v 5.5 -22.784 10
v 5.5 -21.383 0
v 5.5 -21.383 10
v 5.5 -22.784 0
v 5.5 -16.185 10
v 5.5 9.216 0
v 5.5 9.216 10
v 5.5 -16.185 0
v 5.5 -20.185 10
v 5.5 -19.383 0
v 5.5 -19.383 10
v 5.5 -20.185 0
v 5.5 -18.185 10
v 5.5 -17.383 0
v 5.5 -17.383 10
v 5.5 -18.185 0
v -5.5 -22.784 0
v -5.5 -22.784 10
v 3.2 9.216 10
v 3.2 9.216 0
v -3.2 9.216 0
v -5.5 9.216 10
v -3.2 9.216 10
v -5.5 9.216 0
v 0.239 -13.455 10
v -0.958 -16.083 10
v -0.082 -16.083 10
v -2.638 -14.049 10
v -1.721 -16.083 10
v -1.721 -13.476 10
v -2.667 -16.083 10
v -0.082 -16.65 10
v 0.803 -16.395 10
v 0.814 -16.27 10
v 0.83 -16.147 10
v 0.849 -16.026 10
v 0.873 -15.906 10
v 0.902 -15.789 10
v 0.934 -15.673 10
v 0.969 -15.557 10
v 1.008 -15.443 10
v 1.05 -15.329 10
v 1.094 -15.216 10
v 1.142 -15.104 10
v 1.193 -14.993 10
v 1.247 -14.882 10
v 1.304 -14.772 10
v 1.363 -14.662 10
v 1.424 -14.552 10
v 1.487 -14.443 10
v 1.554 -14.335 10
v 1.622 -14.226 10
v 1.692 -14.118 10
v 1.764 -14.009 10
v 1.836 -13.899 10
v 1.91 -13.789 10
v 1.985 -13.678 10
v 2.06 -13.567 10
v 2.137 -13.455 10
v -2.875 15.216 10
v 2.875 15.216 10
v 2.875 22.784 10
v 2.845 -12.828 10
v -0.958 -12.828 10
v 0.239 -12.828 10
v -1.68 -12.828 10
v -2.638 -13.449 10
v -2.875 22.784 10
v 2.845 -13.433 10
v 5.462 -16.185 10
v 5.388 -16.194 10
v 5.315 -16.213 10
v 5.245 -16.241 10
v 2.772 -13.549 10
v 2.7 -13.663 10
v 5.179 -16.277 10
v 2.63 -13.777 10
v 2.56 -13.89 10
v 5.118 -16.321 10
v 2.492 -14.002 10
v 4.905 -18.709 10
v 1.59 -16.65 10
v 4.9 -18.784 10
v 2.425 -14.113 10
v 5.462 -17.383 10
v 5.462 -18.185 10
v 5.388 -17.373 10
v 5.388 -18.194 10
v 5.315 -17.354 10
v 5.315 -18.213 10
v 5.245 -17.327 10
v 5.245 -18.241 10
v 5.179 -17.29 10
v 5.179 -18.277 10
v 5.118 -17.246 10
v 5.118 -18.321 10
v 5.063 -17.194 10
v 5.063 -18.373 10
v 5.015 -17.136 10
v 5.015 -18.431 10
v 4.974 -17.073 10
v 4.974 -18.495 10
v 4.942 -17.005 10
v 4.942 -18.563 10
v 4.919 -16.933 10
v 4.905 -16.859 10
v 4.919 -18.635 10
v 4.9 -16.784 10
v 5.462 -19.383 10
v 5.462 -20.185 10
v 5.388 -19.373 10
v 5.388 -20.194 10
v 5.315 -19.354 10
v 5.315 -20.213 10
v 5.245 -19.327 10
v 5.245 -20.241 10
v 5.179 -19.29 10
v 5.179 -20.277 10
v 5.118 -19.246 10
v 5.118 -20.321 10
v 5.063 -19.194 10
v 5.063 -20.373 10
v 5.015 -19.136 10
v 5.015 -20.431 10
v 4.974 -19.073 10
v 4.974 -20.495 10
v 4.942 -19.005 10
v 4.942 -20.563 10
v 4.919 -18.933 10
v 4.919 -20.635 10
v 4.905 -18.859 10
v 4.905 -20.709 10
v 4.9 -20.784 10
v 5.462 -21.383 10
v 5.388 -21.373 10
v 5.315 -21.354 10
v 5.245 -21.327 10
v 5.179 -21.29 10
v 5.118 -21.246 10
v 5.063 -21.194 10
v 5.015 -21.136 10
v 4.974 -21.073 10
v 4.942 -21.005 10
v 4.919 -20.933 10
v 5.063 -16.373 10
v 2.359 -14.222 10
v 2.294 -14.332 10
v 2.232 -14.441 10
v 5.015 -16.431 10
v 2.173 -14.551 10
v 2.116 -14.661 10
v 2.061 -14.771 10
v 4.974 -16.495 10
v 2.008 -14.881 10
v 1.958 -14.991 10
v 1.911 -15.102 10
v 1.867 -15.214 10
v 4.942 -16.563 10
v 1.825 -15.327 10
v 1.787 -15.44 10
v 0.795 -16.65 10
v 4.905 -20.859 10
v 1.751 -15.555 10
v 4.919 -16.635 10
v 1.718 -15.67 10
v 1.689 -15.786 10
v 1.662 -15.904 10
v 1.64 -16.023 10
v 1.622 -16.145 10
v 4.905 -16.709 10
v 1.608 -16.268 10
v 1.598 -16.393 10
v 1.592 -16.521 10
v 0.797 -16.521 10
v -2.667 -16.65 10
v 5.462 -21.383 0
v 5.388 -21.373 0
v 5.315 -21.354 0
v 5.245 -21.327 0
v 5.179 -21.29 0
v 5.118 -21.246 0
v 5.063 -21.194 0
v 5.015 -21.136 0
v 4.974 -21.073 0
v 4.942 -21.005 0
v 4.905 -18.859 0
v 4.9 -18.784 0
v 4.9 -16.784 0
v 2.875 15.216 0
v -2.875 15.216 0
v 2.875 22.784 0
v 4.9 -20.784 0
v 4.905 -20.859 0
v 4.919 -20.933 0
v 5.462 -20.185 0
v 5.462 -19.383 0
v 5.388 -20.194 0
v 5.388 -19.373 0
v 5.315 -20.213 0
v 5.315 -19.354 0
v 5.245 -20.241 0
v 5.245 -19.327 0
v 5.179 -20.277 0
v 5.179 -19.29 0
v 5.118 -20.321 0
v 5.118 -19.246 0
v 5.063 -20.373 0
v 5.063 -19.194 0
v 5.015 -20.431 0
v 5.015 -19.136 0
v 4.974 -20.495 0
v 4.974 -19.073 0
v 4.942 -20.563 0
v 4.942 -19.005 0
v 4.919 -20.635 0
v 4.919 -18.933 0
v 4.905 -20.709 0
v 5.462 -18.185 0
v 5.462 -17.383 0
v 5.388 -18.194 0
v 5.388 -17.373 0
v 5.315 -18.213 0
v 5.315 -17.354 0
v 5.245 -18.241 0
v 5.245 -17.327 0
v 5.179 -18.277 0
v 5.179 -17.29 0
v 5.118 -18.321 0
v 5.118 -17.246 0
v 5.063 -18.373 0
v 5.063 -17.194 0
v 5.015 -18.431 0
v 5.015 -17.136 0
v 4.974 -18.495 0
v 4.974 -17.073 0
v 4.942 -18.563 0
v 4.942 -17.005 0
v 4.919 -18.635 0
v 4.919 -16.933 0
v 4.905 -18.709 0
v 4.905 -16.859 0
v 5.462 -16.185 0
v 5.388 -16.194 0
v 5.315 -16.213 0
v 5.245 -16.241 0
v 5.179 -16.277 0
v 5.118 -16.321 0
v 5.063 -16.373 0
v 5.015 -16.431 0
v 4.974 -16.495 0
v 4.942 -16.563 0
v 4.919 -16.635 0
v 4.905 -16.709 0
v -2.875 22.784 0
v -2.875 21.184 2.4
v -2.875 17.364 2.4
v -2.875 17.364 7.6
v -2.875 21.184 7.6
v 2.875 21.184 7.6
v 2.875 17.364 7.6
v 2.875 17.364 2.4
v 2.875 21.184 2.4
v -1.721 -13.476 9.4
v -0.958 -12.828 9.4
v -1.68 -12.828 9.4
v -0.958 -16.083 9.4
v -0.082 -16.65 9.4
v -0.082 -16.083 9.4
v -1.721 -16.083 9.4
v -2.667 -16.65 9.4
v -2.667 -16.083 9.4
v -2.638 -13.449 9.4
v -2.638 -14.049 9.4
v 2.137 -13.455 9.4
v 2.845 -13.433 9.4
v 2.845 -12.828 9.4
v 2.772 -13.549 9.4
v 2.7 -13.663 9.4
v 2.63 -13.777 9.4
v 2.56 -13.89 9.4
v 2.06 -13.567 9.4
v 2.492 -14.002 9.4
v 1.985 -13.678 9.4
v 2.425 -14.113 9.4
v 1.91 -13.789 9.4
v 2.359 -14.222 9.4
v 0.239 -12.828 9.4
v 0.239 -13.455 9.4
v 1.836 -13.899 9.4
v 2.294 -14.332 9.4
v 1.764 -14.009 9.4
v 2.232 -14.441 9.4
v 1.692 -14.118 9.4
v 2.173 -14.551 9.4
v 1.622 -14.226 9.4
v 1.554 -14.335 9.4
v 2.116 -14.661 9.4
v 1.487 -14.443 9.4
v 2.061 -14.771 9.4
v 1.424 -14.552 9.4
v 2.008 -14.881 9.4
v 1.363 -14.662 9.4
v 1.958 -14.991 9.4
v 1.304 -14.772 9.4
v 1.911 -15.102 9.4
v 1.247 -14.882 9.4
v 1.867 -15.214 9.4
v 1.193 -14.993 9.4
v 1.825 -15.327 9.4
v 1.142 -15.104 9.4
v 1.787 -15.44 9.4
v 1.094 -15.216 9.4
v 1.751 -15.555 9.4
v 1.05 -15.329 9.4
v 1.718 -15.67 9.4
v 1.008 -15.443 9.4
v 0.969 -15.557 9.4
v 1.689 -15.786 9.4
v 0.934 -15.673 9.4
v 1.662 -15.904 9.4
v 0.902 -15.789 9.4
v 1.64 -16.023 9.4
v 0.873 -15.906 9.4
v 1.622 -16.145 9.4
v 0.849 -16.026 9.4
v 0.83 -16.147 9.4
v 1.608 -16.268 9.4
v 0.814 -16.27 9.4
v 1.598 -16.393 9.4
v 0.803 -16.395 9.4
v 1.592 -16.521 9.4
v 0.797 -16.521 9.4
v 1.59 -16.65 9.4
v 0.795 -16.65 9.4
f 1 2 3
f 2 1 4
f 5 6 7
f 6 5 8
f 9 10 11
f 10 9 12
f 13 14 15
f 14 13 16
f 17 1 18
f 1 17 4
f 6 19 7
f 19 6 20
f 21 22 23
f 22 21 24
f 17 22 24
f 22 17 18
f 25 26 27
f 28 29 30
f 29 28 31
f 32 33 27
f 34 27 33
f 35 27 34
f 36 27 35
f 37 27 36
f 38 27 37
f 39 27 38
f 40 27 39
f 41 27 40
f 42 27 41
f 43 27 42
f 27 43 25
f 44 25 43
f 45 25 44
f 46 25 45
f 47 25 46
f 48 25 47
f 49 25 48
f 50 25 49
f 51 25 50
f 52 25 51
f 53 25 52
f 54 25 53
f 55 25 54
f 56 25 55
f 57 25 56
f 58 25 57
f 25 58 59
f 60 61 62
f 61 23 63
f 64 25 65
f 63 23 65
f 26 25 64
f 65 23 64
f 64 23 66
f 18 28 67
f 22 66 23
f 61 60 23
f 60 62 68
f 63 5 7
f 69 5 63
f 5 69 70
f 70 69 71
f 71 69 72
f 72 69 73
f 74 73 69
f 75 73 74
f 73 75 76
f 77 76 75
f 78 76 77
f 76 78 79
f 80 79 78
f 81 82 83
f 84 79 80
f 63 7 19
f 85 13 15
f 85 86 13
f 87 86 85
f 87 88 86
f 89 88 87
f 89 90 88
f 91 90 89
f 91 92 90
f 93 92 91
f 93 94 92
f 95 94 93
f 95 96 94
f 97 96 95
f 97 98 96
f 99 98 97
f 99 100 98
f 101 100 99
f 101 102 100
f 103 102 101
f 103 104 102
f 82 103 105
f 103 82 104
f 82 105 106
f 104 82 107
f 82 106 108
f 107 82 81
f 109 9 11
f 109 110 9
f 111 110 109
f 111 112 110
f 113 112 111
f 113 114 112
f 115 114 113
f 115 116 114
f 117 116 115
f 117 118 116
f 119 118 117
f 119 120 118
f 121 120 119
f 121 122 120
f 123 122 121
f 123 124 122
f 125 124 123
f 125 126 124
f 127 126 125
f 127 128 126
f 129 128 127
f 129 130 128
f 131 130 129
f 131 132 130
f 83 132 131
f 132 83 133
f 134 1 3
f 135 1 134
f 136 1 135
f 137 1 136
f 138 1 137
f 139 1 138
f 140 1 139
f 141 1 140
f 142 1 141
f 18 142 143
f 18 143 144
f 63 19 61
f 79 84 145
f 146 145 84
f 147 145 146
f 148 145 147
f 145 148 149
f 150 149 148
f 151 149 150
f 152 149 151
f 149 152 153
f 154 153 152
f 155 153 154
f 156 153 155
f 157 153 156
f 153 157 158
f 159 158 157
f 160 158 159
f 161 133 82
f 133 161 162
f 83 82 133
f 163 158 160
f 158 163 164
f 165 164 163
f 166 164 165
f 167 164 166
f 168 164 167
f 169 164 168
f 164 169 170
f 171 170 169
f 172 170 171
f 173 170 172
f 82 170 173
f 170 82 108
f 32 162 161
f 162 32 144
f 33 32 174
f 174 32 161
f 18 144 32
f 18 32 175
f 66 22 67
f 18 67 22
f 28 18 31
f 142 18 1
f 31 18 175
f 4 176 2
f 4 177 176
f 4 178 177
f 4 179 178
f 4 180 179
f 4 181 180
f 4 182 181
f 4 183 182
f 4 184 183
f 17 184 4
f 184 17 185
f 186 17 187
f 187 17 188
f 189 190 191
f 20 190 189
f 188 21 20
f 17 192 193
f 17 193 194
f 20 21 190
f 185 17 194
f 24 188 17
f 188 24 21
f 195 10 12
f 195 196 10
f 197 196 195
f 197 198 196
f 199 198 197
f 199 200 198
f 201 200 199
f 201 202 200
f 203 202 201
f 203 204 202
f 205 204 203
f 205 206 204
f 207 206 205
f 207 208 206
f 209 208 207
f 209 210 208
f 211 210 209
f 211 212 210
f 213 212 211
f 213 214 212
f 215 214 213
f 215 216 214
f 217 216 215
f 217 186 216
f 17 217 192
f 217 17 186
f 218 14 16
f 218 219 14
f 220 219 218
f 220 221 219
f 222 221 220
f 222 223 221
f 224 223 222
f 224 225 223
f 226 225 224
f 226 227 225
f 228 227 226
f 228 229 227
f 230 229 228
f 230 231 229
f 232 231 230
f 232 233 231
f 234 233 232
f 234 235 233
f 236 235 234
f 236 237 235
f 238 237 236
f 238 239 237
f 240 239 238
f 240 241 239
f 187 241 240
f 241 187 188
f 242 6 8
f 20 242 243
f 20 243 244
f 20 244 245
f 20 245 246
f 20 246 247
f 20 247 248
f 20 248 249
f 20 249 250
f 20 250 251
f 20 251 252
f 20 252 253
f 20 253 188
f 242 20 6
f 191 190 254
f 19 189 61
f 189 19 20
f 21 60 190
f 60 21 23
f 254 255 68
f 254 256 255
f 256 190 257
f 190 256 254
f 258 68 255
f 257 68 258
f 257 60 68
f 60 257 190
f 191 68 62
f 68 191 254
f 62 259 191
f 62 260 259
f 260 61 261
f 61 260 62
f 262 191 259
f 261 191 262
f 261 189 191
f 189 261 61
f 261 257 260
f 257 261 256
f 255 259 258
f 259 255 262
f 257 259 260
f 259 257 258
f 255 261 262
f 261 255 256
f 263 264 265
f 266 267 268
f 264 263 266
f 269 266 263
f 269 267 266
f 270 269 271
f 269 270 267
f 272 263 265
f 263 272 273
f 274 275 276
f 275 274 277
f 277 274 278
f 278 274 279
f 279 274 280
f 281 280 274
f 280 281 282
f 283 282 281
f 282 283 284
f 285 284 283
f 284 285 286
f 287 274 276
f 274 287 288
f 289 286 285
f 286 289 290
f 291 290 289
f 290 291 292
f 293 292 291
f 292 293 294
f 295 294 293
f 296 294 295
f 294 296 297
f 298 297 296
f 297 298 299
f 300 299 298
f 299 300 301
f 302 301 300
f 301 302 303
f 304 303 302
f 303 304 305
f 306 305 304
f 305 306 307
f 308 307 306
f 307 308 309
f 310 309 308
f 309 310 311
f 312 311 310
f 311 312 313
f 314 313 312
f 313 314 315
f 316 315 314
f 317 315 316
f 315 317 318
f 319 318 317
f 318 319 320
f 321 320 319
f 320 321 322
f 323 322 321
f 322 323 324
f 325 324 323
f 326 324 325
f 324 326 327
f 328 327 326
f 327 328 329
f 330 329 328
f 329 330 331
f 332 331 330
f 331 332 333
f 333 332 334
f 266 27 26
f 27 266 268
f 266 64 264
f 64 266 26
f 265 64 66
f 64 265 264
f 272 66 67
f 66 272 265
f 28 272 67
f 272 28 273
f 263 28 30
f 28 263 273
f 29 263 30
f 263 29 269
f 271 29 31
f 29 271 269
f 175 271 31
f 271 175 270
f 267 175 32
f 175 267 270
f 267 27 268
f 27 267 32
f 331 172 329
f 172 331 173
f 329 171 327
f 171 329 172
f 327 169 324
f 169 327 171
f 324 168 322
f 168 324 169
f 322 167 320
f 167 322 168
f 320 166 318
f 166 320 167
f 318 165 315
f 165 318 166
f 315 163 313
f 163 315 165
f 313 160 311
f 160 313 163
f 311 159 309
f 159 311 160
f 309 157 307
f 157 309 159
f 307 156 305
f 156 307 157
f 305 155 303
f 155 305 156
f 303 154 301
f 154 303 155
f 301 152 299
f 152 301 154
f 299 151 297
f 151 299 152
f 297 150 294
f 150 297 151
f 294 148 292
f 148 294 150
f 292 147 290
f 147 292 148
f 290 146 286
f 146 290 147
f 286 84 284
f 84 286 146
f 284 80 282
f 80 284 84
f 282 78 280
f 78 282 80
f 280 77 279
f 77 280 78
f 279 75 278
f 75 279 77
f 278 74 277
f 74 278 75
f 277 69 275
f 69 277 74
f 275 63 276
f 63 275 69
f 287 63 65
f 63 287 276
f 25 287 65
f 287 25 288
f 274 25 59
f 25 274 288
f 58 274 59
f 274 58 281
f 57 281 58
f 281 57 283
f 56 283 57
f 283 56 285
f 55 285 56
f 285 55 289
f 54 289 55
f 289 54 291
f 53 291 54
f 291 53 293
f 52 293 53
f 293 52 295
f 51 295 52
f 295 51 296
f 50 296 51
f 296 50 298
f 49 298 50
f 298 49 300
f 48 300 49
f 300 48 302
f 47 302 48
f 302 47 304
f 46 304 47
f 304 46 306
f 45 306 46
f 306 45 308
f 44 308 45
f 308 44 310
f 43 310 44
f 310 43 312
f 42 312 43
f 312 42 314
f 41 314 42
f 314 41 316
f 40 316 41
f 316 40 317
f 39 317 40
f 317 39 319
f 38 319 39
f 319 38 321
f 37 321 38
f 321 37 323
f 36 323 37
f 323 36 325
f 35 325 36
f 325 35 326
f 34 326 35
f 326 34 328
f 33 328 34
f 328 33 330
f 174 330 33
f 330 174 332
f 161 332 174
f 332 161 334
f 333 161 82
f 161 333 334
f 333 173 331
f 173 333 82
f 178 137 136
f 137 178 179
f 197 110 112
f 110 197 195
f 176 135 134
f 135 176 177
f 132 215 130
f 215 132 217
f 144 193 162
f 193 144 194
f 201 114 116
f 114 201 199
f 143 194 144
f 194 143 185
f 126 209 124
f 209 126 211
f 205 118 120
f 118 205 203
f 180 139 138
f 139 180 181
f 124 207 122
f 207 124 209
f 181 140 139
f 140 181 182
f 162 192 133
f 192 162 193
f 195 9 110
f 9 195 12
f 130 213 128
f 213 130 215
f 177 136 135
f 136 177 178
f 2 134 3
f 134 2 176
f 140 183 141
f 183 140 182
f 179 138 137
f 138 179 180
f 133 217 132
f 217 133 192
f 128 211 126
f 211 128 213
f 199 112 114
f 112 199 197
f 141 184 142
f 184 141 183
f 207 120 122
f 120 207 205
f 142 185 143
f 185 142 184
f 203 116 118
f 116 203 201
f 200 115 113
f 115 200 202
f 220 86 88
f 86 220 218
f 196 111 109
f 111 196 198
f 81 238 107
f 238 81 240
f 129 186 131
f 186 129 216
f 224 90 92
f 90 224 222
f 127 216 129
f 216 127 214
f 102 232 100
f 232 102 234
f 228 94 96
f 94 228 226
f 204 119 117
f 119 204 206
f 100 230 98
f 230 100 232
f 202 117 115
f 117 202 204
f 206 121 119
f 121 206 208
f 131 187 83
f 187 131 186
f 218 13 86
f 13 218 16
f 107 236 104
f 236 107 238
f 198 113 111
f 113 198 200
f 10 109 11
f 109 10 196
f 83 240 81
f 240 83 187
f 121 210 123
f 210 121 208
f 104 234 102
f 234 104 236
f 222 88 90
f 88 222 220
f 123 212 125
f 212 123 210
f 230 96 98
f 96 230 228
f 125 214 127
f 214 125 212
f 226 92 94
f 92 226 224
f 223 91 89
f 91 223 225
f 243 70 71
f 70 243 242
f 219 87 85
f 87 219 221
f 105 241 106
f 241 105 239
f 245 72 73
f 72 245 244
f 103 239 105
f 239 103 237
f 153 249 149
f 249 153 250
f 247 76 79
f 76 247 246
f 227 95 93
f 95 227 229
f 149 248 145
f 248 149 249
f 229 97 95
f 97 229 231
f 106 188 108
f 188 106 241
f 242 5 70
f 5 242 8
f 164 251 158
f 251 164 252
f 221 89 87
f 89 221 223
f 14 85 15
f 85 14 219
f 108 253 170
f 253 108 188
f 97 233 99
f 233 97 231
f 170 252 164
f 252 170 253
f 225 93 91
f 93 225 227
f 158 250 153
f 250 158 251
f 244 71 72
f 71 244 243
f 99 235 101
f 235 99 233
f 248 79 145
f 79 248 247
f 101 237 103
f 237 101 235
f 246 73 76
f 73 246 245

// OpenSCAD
$fn = 50;

difference() {
	union() {
		translate(v = [0, 9.21625, 0]) {
			rotate(a = [90, 0, 0]) {
				difference() {
					union() {
						translate(v = [-5.5, 0, 0]) {
							cube(size = [11.0, 10.0, 32.0]);
						}
						translate(v = [0, 10.0, 0]) {
							rotate(a = [90, 0, 0]) {
								linear_extrude(height = 10.0) {
									polygon(points = [[-2.875, -13.5675], [2.875, -13.5675], [2.875, -6.0], [3.2, 0], [3.2, 0.1], [-3.2, 0.1], [-3.2, 0], [-2.875, -6.0]]);
								}
							}
						}
					}
					union() {
						translate(v = [-2.975, 2.4000000000000004, -11.9675]) {
							cube(size = [5.95, 5.199999999999999, 3.8200000000000003]);
						}
						translate(v = [0, 9.4, 24.0]) {
							rotate(a = [-90, 0, 0]) {
								linear_extrude(height = 0.7) {
									text(font = "Arial:style=Bold", halign = "center", size = 4.0, text = "17", valign = "center");
								}
							}
						}
						translate(v = [5.5, 10.1, 30.0]) {
							rotate(a = [90, 0, 0]) {
								cylinder(h = 10.2, r = 0.6);
							}
						}
						translate(v = [5.5, 10.1, 28.0]) {
							rotate(a = [90, 0, 0]) {
								cylinder(h = 10.2, r = 0.6);
							}
						}
						translate(v = [5.5, 10.1, 26.0]) {
							rotate(a = [90, 0, 0]) {
								cylinder(h = 10.2, r = 0.6);
							}
						}
					}
				}
			}
		}
	}
	union();
}
